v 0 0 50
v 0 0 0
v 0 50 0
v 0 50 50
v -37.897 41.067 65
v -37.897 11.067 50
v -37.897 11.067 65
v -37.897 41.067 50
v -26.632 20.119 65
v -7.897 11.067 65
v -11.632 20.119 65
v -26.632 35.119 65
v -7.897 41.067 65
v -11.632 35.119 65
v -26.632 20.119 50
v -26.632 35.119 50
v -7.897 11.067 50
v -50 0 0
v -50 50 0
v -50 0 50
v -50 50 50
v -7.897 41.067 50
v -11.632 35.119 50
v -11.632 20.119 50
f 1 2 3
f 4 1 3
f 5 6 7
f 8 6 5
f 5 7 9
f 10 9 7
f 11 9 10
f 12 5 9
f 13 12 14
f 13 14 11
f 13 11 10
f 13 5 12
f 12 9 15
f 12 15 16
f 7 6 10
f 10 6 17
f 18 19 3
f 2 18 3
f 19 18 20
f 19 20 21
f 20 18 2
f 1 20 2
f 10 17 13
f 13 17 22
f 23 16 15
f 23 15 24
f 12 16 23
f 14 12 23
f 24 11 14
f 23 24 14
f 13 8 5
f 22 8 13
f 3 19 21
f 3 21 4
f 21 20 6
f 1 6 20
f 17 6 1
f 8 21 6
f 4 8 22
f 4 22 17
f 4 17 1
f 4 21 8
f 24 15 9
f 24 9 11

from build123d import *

# Parameters (mm, degrees)
F0_W     = 50
F0_H     = 50
F1_DEPTH = 50
F2_W     = 30
F2_H     = 30
F2_W_2   = 15
F2_H_2   = 15
F3_DEPTH = 15
F4_DEPTH = 15


with BuildPart() as f1:
    # F0 (on Top) → F1 (new body)
    with BuildSketch(Plane.XY):
        with Locations((-25, 25)):
            Rectangle(F0_W, F0_H)
    extrude(amount=F1_DEPTH)

    # F2 (on face) → F3 (join)
    with BuildSketch(Plane.XY.offset(50)):
        with Locations((-22.896898, 26.06651)):
            Rectangle(F2_W, F2_H)
        with Locations((-19.131815, 27.618613)):
            Rectangle(F2_W_2, F2_H_2, mode=Mode.SUBTRACT)
    extrude(amount=F3_DEPTH)

    # F2 (on face) → F4 (join)
    with BuildSketch(Plane.XY.offset(50)):
        with Locations((-22.896898, 26.06651)):
            Rectangle(F2_W, F2_H)
        with Locations((-19.131815, 27.618613)):
            Rectangle(F2_W_2, F2_H_2, mode=Mode.SUBTRACT)
    extrude(amount=F4_DEPTH)


solid = f1.part
